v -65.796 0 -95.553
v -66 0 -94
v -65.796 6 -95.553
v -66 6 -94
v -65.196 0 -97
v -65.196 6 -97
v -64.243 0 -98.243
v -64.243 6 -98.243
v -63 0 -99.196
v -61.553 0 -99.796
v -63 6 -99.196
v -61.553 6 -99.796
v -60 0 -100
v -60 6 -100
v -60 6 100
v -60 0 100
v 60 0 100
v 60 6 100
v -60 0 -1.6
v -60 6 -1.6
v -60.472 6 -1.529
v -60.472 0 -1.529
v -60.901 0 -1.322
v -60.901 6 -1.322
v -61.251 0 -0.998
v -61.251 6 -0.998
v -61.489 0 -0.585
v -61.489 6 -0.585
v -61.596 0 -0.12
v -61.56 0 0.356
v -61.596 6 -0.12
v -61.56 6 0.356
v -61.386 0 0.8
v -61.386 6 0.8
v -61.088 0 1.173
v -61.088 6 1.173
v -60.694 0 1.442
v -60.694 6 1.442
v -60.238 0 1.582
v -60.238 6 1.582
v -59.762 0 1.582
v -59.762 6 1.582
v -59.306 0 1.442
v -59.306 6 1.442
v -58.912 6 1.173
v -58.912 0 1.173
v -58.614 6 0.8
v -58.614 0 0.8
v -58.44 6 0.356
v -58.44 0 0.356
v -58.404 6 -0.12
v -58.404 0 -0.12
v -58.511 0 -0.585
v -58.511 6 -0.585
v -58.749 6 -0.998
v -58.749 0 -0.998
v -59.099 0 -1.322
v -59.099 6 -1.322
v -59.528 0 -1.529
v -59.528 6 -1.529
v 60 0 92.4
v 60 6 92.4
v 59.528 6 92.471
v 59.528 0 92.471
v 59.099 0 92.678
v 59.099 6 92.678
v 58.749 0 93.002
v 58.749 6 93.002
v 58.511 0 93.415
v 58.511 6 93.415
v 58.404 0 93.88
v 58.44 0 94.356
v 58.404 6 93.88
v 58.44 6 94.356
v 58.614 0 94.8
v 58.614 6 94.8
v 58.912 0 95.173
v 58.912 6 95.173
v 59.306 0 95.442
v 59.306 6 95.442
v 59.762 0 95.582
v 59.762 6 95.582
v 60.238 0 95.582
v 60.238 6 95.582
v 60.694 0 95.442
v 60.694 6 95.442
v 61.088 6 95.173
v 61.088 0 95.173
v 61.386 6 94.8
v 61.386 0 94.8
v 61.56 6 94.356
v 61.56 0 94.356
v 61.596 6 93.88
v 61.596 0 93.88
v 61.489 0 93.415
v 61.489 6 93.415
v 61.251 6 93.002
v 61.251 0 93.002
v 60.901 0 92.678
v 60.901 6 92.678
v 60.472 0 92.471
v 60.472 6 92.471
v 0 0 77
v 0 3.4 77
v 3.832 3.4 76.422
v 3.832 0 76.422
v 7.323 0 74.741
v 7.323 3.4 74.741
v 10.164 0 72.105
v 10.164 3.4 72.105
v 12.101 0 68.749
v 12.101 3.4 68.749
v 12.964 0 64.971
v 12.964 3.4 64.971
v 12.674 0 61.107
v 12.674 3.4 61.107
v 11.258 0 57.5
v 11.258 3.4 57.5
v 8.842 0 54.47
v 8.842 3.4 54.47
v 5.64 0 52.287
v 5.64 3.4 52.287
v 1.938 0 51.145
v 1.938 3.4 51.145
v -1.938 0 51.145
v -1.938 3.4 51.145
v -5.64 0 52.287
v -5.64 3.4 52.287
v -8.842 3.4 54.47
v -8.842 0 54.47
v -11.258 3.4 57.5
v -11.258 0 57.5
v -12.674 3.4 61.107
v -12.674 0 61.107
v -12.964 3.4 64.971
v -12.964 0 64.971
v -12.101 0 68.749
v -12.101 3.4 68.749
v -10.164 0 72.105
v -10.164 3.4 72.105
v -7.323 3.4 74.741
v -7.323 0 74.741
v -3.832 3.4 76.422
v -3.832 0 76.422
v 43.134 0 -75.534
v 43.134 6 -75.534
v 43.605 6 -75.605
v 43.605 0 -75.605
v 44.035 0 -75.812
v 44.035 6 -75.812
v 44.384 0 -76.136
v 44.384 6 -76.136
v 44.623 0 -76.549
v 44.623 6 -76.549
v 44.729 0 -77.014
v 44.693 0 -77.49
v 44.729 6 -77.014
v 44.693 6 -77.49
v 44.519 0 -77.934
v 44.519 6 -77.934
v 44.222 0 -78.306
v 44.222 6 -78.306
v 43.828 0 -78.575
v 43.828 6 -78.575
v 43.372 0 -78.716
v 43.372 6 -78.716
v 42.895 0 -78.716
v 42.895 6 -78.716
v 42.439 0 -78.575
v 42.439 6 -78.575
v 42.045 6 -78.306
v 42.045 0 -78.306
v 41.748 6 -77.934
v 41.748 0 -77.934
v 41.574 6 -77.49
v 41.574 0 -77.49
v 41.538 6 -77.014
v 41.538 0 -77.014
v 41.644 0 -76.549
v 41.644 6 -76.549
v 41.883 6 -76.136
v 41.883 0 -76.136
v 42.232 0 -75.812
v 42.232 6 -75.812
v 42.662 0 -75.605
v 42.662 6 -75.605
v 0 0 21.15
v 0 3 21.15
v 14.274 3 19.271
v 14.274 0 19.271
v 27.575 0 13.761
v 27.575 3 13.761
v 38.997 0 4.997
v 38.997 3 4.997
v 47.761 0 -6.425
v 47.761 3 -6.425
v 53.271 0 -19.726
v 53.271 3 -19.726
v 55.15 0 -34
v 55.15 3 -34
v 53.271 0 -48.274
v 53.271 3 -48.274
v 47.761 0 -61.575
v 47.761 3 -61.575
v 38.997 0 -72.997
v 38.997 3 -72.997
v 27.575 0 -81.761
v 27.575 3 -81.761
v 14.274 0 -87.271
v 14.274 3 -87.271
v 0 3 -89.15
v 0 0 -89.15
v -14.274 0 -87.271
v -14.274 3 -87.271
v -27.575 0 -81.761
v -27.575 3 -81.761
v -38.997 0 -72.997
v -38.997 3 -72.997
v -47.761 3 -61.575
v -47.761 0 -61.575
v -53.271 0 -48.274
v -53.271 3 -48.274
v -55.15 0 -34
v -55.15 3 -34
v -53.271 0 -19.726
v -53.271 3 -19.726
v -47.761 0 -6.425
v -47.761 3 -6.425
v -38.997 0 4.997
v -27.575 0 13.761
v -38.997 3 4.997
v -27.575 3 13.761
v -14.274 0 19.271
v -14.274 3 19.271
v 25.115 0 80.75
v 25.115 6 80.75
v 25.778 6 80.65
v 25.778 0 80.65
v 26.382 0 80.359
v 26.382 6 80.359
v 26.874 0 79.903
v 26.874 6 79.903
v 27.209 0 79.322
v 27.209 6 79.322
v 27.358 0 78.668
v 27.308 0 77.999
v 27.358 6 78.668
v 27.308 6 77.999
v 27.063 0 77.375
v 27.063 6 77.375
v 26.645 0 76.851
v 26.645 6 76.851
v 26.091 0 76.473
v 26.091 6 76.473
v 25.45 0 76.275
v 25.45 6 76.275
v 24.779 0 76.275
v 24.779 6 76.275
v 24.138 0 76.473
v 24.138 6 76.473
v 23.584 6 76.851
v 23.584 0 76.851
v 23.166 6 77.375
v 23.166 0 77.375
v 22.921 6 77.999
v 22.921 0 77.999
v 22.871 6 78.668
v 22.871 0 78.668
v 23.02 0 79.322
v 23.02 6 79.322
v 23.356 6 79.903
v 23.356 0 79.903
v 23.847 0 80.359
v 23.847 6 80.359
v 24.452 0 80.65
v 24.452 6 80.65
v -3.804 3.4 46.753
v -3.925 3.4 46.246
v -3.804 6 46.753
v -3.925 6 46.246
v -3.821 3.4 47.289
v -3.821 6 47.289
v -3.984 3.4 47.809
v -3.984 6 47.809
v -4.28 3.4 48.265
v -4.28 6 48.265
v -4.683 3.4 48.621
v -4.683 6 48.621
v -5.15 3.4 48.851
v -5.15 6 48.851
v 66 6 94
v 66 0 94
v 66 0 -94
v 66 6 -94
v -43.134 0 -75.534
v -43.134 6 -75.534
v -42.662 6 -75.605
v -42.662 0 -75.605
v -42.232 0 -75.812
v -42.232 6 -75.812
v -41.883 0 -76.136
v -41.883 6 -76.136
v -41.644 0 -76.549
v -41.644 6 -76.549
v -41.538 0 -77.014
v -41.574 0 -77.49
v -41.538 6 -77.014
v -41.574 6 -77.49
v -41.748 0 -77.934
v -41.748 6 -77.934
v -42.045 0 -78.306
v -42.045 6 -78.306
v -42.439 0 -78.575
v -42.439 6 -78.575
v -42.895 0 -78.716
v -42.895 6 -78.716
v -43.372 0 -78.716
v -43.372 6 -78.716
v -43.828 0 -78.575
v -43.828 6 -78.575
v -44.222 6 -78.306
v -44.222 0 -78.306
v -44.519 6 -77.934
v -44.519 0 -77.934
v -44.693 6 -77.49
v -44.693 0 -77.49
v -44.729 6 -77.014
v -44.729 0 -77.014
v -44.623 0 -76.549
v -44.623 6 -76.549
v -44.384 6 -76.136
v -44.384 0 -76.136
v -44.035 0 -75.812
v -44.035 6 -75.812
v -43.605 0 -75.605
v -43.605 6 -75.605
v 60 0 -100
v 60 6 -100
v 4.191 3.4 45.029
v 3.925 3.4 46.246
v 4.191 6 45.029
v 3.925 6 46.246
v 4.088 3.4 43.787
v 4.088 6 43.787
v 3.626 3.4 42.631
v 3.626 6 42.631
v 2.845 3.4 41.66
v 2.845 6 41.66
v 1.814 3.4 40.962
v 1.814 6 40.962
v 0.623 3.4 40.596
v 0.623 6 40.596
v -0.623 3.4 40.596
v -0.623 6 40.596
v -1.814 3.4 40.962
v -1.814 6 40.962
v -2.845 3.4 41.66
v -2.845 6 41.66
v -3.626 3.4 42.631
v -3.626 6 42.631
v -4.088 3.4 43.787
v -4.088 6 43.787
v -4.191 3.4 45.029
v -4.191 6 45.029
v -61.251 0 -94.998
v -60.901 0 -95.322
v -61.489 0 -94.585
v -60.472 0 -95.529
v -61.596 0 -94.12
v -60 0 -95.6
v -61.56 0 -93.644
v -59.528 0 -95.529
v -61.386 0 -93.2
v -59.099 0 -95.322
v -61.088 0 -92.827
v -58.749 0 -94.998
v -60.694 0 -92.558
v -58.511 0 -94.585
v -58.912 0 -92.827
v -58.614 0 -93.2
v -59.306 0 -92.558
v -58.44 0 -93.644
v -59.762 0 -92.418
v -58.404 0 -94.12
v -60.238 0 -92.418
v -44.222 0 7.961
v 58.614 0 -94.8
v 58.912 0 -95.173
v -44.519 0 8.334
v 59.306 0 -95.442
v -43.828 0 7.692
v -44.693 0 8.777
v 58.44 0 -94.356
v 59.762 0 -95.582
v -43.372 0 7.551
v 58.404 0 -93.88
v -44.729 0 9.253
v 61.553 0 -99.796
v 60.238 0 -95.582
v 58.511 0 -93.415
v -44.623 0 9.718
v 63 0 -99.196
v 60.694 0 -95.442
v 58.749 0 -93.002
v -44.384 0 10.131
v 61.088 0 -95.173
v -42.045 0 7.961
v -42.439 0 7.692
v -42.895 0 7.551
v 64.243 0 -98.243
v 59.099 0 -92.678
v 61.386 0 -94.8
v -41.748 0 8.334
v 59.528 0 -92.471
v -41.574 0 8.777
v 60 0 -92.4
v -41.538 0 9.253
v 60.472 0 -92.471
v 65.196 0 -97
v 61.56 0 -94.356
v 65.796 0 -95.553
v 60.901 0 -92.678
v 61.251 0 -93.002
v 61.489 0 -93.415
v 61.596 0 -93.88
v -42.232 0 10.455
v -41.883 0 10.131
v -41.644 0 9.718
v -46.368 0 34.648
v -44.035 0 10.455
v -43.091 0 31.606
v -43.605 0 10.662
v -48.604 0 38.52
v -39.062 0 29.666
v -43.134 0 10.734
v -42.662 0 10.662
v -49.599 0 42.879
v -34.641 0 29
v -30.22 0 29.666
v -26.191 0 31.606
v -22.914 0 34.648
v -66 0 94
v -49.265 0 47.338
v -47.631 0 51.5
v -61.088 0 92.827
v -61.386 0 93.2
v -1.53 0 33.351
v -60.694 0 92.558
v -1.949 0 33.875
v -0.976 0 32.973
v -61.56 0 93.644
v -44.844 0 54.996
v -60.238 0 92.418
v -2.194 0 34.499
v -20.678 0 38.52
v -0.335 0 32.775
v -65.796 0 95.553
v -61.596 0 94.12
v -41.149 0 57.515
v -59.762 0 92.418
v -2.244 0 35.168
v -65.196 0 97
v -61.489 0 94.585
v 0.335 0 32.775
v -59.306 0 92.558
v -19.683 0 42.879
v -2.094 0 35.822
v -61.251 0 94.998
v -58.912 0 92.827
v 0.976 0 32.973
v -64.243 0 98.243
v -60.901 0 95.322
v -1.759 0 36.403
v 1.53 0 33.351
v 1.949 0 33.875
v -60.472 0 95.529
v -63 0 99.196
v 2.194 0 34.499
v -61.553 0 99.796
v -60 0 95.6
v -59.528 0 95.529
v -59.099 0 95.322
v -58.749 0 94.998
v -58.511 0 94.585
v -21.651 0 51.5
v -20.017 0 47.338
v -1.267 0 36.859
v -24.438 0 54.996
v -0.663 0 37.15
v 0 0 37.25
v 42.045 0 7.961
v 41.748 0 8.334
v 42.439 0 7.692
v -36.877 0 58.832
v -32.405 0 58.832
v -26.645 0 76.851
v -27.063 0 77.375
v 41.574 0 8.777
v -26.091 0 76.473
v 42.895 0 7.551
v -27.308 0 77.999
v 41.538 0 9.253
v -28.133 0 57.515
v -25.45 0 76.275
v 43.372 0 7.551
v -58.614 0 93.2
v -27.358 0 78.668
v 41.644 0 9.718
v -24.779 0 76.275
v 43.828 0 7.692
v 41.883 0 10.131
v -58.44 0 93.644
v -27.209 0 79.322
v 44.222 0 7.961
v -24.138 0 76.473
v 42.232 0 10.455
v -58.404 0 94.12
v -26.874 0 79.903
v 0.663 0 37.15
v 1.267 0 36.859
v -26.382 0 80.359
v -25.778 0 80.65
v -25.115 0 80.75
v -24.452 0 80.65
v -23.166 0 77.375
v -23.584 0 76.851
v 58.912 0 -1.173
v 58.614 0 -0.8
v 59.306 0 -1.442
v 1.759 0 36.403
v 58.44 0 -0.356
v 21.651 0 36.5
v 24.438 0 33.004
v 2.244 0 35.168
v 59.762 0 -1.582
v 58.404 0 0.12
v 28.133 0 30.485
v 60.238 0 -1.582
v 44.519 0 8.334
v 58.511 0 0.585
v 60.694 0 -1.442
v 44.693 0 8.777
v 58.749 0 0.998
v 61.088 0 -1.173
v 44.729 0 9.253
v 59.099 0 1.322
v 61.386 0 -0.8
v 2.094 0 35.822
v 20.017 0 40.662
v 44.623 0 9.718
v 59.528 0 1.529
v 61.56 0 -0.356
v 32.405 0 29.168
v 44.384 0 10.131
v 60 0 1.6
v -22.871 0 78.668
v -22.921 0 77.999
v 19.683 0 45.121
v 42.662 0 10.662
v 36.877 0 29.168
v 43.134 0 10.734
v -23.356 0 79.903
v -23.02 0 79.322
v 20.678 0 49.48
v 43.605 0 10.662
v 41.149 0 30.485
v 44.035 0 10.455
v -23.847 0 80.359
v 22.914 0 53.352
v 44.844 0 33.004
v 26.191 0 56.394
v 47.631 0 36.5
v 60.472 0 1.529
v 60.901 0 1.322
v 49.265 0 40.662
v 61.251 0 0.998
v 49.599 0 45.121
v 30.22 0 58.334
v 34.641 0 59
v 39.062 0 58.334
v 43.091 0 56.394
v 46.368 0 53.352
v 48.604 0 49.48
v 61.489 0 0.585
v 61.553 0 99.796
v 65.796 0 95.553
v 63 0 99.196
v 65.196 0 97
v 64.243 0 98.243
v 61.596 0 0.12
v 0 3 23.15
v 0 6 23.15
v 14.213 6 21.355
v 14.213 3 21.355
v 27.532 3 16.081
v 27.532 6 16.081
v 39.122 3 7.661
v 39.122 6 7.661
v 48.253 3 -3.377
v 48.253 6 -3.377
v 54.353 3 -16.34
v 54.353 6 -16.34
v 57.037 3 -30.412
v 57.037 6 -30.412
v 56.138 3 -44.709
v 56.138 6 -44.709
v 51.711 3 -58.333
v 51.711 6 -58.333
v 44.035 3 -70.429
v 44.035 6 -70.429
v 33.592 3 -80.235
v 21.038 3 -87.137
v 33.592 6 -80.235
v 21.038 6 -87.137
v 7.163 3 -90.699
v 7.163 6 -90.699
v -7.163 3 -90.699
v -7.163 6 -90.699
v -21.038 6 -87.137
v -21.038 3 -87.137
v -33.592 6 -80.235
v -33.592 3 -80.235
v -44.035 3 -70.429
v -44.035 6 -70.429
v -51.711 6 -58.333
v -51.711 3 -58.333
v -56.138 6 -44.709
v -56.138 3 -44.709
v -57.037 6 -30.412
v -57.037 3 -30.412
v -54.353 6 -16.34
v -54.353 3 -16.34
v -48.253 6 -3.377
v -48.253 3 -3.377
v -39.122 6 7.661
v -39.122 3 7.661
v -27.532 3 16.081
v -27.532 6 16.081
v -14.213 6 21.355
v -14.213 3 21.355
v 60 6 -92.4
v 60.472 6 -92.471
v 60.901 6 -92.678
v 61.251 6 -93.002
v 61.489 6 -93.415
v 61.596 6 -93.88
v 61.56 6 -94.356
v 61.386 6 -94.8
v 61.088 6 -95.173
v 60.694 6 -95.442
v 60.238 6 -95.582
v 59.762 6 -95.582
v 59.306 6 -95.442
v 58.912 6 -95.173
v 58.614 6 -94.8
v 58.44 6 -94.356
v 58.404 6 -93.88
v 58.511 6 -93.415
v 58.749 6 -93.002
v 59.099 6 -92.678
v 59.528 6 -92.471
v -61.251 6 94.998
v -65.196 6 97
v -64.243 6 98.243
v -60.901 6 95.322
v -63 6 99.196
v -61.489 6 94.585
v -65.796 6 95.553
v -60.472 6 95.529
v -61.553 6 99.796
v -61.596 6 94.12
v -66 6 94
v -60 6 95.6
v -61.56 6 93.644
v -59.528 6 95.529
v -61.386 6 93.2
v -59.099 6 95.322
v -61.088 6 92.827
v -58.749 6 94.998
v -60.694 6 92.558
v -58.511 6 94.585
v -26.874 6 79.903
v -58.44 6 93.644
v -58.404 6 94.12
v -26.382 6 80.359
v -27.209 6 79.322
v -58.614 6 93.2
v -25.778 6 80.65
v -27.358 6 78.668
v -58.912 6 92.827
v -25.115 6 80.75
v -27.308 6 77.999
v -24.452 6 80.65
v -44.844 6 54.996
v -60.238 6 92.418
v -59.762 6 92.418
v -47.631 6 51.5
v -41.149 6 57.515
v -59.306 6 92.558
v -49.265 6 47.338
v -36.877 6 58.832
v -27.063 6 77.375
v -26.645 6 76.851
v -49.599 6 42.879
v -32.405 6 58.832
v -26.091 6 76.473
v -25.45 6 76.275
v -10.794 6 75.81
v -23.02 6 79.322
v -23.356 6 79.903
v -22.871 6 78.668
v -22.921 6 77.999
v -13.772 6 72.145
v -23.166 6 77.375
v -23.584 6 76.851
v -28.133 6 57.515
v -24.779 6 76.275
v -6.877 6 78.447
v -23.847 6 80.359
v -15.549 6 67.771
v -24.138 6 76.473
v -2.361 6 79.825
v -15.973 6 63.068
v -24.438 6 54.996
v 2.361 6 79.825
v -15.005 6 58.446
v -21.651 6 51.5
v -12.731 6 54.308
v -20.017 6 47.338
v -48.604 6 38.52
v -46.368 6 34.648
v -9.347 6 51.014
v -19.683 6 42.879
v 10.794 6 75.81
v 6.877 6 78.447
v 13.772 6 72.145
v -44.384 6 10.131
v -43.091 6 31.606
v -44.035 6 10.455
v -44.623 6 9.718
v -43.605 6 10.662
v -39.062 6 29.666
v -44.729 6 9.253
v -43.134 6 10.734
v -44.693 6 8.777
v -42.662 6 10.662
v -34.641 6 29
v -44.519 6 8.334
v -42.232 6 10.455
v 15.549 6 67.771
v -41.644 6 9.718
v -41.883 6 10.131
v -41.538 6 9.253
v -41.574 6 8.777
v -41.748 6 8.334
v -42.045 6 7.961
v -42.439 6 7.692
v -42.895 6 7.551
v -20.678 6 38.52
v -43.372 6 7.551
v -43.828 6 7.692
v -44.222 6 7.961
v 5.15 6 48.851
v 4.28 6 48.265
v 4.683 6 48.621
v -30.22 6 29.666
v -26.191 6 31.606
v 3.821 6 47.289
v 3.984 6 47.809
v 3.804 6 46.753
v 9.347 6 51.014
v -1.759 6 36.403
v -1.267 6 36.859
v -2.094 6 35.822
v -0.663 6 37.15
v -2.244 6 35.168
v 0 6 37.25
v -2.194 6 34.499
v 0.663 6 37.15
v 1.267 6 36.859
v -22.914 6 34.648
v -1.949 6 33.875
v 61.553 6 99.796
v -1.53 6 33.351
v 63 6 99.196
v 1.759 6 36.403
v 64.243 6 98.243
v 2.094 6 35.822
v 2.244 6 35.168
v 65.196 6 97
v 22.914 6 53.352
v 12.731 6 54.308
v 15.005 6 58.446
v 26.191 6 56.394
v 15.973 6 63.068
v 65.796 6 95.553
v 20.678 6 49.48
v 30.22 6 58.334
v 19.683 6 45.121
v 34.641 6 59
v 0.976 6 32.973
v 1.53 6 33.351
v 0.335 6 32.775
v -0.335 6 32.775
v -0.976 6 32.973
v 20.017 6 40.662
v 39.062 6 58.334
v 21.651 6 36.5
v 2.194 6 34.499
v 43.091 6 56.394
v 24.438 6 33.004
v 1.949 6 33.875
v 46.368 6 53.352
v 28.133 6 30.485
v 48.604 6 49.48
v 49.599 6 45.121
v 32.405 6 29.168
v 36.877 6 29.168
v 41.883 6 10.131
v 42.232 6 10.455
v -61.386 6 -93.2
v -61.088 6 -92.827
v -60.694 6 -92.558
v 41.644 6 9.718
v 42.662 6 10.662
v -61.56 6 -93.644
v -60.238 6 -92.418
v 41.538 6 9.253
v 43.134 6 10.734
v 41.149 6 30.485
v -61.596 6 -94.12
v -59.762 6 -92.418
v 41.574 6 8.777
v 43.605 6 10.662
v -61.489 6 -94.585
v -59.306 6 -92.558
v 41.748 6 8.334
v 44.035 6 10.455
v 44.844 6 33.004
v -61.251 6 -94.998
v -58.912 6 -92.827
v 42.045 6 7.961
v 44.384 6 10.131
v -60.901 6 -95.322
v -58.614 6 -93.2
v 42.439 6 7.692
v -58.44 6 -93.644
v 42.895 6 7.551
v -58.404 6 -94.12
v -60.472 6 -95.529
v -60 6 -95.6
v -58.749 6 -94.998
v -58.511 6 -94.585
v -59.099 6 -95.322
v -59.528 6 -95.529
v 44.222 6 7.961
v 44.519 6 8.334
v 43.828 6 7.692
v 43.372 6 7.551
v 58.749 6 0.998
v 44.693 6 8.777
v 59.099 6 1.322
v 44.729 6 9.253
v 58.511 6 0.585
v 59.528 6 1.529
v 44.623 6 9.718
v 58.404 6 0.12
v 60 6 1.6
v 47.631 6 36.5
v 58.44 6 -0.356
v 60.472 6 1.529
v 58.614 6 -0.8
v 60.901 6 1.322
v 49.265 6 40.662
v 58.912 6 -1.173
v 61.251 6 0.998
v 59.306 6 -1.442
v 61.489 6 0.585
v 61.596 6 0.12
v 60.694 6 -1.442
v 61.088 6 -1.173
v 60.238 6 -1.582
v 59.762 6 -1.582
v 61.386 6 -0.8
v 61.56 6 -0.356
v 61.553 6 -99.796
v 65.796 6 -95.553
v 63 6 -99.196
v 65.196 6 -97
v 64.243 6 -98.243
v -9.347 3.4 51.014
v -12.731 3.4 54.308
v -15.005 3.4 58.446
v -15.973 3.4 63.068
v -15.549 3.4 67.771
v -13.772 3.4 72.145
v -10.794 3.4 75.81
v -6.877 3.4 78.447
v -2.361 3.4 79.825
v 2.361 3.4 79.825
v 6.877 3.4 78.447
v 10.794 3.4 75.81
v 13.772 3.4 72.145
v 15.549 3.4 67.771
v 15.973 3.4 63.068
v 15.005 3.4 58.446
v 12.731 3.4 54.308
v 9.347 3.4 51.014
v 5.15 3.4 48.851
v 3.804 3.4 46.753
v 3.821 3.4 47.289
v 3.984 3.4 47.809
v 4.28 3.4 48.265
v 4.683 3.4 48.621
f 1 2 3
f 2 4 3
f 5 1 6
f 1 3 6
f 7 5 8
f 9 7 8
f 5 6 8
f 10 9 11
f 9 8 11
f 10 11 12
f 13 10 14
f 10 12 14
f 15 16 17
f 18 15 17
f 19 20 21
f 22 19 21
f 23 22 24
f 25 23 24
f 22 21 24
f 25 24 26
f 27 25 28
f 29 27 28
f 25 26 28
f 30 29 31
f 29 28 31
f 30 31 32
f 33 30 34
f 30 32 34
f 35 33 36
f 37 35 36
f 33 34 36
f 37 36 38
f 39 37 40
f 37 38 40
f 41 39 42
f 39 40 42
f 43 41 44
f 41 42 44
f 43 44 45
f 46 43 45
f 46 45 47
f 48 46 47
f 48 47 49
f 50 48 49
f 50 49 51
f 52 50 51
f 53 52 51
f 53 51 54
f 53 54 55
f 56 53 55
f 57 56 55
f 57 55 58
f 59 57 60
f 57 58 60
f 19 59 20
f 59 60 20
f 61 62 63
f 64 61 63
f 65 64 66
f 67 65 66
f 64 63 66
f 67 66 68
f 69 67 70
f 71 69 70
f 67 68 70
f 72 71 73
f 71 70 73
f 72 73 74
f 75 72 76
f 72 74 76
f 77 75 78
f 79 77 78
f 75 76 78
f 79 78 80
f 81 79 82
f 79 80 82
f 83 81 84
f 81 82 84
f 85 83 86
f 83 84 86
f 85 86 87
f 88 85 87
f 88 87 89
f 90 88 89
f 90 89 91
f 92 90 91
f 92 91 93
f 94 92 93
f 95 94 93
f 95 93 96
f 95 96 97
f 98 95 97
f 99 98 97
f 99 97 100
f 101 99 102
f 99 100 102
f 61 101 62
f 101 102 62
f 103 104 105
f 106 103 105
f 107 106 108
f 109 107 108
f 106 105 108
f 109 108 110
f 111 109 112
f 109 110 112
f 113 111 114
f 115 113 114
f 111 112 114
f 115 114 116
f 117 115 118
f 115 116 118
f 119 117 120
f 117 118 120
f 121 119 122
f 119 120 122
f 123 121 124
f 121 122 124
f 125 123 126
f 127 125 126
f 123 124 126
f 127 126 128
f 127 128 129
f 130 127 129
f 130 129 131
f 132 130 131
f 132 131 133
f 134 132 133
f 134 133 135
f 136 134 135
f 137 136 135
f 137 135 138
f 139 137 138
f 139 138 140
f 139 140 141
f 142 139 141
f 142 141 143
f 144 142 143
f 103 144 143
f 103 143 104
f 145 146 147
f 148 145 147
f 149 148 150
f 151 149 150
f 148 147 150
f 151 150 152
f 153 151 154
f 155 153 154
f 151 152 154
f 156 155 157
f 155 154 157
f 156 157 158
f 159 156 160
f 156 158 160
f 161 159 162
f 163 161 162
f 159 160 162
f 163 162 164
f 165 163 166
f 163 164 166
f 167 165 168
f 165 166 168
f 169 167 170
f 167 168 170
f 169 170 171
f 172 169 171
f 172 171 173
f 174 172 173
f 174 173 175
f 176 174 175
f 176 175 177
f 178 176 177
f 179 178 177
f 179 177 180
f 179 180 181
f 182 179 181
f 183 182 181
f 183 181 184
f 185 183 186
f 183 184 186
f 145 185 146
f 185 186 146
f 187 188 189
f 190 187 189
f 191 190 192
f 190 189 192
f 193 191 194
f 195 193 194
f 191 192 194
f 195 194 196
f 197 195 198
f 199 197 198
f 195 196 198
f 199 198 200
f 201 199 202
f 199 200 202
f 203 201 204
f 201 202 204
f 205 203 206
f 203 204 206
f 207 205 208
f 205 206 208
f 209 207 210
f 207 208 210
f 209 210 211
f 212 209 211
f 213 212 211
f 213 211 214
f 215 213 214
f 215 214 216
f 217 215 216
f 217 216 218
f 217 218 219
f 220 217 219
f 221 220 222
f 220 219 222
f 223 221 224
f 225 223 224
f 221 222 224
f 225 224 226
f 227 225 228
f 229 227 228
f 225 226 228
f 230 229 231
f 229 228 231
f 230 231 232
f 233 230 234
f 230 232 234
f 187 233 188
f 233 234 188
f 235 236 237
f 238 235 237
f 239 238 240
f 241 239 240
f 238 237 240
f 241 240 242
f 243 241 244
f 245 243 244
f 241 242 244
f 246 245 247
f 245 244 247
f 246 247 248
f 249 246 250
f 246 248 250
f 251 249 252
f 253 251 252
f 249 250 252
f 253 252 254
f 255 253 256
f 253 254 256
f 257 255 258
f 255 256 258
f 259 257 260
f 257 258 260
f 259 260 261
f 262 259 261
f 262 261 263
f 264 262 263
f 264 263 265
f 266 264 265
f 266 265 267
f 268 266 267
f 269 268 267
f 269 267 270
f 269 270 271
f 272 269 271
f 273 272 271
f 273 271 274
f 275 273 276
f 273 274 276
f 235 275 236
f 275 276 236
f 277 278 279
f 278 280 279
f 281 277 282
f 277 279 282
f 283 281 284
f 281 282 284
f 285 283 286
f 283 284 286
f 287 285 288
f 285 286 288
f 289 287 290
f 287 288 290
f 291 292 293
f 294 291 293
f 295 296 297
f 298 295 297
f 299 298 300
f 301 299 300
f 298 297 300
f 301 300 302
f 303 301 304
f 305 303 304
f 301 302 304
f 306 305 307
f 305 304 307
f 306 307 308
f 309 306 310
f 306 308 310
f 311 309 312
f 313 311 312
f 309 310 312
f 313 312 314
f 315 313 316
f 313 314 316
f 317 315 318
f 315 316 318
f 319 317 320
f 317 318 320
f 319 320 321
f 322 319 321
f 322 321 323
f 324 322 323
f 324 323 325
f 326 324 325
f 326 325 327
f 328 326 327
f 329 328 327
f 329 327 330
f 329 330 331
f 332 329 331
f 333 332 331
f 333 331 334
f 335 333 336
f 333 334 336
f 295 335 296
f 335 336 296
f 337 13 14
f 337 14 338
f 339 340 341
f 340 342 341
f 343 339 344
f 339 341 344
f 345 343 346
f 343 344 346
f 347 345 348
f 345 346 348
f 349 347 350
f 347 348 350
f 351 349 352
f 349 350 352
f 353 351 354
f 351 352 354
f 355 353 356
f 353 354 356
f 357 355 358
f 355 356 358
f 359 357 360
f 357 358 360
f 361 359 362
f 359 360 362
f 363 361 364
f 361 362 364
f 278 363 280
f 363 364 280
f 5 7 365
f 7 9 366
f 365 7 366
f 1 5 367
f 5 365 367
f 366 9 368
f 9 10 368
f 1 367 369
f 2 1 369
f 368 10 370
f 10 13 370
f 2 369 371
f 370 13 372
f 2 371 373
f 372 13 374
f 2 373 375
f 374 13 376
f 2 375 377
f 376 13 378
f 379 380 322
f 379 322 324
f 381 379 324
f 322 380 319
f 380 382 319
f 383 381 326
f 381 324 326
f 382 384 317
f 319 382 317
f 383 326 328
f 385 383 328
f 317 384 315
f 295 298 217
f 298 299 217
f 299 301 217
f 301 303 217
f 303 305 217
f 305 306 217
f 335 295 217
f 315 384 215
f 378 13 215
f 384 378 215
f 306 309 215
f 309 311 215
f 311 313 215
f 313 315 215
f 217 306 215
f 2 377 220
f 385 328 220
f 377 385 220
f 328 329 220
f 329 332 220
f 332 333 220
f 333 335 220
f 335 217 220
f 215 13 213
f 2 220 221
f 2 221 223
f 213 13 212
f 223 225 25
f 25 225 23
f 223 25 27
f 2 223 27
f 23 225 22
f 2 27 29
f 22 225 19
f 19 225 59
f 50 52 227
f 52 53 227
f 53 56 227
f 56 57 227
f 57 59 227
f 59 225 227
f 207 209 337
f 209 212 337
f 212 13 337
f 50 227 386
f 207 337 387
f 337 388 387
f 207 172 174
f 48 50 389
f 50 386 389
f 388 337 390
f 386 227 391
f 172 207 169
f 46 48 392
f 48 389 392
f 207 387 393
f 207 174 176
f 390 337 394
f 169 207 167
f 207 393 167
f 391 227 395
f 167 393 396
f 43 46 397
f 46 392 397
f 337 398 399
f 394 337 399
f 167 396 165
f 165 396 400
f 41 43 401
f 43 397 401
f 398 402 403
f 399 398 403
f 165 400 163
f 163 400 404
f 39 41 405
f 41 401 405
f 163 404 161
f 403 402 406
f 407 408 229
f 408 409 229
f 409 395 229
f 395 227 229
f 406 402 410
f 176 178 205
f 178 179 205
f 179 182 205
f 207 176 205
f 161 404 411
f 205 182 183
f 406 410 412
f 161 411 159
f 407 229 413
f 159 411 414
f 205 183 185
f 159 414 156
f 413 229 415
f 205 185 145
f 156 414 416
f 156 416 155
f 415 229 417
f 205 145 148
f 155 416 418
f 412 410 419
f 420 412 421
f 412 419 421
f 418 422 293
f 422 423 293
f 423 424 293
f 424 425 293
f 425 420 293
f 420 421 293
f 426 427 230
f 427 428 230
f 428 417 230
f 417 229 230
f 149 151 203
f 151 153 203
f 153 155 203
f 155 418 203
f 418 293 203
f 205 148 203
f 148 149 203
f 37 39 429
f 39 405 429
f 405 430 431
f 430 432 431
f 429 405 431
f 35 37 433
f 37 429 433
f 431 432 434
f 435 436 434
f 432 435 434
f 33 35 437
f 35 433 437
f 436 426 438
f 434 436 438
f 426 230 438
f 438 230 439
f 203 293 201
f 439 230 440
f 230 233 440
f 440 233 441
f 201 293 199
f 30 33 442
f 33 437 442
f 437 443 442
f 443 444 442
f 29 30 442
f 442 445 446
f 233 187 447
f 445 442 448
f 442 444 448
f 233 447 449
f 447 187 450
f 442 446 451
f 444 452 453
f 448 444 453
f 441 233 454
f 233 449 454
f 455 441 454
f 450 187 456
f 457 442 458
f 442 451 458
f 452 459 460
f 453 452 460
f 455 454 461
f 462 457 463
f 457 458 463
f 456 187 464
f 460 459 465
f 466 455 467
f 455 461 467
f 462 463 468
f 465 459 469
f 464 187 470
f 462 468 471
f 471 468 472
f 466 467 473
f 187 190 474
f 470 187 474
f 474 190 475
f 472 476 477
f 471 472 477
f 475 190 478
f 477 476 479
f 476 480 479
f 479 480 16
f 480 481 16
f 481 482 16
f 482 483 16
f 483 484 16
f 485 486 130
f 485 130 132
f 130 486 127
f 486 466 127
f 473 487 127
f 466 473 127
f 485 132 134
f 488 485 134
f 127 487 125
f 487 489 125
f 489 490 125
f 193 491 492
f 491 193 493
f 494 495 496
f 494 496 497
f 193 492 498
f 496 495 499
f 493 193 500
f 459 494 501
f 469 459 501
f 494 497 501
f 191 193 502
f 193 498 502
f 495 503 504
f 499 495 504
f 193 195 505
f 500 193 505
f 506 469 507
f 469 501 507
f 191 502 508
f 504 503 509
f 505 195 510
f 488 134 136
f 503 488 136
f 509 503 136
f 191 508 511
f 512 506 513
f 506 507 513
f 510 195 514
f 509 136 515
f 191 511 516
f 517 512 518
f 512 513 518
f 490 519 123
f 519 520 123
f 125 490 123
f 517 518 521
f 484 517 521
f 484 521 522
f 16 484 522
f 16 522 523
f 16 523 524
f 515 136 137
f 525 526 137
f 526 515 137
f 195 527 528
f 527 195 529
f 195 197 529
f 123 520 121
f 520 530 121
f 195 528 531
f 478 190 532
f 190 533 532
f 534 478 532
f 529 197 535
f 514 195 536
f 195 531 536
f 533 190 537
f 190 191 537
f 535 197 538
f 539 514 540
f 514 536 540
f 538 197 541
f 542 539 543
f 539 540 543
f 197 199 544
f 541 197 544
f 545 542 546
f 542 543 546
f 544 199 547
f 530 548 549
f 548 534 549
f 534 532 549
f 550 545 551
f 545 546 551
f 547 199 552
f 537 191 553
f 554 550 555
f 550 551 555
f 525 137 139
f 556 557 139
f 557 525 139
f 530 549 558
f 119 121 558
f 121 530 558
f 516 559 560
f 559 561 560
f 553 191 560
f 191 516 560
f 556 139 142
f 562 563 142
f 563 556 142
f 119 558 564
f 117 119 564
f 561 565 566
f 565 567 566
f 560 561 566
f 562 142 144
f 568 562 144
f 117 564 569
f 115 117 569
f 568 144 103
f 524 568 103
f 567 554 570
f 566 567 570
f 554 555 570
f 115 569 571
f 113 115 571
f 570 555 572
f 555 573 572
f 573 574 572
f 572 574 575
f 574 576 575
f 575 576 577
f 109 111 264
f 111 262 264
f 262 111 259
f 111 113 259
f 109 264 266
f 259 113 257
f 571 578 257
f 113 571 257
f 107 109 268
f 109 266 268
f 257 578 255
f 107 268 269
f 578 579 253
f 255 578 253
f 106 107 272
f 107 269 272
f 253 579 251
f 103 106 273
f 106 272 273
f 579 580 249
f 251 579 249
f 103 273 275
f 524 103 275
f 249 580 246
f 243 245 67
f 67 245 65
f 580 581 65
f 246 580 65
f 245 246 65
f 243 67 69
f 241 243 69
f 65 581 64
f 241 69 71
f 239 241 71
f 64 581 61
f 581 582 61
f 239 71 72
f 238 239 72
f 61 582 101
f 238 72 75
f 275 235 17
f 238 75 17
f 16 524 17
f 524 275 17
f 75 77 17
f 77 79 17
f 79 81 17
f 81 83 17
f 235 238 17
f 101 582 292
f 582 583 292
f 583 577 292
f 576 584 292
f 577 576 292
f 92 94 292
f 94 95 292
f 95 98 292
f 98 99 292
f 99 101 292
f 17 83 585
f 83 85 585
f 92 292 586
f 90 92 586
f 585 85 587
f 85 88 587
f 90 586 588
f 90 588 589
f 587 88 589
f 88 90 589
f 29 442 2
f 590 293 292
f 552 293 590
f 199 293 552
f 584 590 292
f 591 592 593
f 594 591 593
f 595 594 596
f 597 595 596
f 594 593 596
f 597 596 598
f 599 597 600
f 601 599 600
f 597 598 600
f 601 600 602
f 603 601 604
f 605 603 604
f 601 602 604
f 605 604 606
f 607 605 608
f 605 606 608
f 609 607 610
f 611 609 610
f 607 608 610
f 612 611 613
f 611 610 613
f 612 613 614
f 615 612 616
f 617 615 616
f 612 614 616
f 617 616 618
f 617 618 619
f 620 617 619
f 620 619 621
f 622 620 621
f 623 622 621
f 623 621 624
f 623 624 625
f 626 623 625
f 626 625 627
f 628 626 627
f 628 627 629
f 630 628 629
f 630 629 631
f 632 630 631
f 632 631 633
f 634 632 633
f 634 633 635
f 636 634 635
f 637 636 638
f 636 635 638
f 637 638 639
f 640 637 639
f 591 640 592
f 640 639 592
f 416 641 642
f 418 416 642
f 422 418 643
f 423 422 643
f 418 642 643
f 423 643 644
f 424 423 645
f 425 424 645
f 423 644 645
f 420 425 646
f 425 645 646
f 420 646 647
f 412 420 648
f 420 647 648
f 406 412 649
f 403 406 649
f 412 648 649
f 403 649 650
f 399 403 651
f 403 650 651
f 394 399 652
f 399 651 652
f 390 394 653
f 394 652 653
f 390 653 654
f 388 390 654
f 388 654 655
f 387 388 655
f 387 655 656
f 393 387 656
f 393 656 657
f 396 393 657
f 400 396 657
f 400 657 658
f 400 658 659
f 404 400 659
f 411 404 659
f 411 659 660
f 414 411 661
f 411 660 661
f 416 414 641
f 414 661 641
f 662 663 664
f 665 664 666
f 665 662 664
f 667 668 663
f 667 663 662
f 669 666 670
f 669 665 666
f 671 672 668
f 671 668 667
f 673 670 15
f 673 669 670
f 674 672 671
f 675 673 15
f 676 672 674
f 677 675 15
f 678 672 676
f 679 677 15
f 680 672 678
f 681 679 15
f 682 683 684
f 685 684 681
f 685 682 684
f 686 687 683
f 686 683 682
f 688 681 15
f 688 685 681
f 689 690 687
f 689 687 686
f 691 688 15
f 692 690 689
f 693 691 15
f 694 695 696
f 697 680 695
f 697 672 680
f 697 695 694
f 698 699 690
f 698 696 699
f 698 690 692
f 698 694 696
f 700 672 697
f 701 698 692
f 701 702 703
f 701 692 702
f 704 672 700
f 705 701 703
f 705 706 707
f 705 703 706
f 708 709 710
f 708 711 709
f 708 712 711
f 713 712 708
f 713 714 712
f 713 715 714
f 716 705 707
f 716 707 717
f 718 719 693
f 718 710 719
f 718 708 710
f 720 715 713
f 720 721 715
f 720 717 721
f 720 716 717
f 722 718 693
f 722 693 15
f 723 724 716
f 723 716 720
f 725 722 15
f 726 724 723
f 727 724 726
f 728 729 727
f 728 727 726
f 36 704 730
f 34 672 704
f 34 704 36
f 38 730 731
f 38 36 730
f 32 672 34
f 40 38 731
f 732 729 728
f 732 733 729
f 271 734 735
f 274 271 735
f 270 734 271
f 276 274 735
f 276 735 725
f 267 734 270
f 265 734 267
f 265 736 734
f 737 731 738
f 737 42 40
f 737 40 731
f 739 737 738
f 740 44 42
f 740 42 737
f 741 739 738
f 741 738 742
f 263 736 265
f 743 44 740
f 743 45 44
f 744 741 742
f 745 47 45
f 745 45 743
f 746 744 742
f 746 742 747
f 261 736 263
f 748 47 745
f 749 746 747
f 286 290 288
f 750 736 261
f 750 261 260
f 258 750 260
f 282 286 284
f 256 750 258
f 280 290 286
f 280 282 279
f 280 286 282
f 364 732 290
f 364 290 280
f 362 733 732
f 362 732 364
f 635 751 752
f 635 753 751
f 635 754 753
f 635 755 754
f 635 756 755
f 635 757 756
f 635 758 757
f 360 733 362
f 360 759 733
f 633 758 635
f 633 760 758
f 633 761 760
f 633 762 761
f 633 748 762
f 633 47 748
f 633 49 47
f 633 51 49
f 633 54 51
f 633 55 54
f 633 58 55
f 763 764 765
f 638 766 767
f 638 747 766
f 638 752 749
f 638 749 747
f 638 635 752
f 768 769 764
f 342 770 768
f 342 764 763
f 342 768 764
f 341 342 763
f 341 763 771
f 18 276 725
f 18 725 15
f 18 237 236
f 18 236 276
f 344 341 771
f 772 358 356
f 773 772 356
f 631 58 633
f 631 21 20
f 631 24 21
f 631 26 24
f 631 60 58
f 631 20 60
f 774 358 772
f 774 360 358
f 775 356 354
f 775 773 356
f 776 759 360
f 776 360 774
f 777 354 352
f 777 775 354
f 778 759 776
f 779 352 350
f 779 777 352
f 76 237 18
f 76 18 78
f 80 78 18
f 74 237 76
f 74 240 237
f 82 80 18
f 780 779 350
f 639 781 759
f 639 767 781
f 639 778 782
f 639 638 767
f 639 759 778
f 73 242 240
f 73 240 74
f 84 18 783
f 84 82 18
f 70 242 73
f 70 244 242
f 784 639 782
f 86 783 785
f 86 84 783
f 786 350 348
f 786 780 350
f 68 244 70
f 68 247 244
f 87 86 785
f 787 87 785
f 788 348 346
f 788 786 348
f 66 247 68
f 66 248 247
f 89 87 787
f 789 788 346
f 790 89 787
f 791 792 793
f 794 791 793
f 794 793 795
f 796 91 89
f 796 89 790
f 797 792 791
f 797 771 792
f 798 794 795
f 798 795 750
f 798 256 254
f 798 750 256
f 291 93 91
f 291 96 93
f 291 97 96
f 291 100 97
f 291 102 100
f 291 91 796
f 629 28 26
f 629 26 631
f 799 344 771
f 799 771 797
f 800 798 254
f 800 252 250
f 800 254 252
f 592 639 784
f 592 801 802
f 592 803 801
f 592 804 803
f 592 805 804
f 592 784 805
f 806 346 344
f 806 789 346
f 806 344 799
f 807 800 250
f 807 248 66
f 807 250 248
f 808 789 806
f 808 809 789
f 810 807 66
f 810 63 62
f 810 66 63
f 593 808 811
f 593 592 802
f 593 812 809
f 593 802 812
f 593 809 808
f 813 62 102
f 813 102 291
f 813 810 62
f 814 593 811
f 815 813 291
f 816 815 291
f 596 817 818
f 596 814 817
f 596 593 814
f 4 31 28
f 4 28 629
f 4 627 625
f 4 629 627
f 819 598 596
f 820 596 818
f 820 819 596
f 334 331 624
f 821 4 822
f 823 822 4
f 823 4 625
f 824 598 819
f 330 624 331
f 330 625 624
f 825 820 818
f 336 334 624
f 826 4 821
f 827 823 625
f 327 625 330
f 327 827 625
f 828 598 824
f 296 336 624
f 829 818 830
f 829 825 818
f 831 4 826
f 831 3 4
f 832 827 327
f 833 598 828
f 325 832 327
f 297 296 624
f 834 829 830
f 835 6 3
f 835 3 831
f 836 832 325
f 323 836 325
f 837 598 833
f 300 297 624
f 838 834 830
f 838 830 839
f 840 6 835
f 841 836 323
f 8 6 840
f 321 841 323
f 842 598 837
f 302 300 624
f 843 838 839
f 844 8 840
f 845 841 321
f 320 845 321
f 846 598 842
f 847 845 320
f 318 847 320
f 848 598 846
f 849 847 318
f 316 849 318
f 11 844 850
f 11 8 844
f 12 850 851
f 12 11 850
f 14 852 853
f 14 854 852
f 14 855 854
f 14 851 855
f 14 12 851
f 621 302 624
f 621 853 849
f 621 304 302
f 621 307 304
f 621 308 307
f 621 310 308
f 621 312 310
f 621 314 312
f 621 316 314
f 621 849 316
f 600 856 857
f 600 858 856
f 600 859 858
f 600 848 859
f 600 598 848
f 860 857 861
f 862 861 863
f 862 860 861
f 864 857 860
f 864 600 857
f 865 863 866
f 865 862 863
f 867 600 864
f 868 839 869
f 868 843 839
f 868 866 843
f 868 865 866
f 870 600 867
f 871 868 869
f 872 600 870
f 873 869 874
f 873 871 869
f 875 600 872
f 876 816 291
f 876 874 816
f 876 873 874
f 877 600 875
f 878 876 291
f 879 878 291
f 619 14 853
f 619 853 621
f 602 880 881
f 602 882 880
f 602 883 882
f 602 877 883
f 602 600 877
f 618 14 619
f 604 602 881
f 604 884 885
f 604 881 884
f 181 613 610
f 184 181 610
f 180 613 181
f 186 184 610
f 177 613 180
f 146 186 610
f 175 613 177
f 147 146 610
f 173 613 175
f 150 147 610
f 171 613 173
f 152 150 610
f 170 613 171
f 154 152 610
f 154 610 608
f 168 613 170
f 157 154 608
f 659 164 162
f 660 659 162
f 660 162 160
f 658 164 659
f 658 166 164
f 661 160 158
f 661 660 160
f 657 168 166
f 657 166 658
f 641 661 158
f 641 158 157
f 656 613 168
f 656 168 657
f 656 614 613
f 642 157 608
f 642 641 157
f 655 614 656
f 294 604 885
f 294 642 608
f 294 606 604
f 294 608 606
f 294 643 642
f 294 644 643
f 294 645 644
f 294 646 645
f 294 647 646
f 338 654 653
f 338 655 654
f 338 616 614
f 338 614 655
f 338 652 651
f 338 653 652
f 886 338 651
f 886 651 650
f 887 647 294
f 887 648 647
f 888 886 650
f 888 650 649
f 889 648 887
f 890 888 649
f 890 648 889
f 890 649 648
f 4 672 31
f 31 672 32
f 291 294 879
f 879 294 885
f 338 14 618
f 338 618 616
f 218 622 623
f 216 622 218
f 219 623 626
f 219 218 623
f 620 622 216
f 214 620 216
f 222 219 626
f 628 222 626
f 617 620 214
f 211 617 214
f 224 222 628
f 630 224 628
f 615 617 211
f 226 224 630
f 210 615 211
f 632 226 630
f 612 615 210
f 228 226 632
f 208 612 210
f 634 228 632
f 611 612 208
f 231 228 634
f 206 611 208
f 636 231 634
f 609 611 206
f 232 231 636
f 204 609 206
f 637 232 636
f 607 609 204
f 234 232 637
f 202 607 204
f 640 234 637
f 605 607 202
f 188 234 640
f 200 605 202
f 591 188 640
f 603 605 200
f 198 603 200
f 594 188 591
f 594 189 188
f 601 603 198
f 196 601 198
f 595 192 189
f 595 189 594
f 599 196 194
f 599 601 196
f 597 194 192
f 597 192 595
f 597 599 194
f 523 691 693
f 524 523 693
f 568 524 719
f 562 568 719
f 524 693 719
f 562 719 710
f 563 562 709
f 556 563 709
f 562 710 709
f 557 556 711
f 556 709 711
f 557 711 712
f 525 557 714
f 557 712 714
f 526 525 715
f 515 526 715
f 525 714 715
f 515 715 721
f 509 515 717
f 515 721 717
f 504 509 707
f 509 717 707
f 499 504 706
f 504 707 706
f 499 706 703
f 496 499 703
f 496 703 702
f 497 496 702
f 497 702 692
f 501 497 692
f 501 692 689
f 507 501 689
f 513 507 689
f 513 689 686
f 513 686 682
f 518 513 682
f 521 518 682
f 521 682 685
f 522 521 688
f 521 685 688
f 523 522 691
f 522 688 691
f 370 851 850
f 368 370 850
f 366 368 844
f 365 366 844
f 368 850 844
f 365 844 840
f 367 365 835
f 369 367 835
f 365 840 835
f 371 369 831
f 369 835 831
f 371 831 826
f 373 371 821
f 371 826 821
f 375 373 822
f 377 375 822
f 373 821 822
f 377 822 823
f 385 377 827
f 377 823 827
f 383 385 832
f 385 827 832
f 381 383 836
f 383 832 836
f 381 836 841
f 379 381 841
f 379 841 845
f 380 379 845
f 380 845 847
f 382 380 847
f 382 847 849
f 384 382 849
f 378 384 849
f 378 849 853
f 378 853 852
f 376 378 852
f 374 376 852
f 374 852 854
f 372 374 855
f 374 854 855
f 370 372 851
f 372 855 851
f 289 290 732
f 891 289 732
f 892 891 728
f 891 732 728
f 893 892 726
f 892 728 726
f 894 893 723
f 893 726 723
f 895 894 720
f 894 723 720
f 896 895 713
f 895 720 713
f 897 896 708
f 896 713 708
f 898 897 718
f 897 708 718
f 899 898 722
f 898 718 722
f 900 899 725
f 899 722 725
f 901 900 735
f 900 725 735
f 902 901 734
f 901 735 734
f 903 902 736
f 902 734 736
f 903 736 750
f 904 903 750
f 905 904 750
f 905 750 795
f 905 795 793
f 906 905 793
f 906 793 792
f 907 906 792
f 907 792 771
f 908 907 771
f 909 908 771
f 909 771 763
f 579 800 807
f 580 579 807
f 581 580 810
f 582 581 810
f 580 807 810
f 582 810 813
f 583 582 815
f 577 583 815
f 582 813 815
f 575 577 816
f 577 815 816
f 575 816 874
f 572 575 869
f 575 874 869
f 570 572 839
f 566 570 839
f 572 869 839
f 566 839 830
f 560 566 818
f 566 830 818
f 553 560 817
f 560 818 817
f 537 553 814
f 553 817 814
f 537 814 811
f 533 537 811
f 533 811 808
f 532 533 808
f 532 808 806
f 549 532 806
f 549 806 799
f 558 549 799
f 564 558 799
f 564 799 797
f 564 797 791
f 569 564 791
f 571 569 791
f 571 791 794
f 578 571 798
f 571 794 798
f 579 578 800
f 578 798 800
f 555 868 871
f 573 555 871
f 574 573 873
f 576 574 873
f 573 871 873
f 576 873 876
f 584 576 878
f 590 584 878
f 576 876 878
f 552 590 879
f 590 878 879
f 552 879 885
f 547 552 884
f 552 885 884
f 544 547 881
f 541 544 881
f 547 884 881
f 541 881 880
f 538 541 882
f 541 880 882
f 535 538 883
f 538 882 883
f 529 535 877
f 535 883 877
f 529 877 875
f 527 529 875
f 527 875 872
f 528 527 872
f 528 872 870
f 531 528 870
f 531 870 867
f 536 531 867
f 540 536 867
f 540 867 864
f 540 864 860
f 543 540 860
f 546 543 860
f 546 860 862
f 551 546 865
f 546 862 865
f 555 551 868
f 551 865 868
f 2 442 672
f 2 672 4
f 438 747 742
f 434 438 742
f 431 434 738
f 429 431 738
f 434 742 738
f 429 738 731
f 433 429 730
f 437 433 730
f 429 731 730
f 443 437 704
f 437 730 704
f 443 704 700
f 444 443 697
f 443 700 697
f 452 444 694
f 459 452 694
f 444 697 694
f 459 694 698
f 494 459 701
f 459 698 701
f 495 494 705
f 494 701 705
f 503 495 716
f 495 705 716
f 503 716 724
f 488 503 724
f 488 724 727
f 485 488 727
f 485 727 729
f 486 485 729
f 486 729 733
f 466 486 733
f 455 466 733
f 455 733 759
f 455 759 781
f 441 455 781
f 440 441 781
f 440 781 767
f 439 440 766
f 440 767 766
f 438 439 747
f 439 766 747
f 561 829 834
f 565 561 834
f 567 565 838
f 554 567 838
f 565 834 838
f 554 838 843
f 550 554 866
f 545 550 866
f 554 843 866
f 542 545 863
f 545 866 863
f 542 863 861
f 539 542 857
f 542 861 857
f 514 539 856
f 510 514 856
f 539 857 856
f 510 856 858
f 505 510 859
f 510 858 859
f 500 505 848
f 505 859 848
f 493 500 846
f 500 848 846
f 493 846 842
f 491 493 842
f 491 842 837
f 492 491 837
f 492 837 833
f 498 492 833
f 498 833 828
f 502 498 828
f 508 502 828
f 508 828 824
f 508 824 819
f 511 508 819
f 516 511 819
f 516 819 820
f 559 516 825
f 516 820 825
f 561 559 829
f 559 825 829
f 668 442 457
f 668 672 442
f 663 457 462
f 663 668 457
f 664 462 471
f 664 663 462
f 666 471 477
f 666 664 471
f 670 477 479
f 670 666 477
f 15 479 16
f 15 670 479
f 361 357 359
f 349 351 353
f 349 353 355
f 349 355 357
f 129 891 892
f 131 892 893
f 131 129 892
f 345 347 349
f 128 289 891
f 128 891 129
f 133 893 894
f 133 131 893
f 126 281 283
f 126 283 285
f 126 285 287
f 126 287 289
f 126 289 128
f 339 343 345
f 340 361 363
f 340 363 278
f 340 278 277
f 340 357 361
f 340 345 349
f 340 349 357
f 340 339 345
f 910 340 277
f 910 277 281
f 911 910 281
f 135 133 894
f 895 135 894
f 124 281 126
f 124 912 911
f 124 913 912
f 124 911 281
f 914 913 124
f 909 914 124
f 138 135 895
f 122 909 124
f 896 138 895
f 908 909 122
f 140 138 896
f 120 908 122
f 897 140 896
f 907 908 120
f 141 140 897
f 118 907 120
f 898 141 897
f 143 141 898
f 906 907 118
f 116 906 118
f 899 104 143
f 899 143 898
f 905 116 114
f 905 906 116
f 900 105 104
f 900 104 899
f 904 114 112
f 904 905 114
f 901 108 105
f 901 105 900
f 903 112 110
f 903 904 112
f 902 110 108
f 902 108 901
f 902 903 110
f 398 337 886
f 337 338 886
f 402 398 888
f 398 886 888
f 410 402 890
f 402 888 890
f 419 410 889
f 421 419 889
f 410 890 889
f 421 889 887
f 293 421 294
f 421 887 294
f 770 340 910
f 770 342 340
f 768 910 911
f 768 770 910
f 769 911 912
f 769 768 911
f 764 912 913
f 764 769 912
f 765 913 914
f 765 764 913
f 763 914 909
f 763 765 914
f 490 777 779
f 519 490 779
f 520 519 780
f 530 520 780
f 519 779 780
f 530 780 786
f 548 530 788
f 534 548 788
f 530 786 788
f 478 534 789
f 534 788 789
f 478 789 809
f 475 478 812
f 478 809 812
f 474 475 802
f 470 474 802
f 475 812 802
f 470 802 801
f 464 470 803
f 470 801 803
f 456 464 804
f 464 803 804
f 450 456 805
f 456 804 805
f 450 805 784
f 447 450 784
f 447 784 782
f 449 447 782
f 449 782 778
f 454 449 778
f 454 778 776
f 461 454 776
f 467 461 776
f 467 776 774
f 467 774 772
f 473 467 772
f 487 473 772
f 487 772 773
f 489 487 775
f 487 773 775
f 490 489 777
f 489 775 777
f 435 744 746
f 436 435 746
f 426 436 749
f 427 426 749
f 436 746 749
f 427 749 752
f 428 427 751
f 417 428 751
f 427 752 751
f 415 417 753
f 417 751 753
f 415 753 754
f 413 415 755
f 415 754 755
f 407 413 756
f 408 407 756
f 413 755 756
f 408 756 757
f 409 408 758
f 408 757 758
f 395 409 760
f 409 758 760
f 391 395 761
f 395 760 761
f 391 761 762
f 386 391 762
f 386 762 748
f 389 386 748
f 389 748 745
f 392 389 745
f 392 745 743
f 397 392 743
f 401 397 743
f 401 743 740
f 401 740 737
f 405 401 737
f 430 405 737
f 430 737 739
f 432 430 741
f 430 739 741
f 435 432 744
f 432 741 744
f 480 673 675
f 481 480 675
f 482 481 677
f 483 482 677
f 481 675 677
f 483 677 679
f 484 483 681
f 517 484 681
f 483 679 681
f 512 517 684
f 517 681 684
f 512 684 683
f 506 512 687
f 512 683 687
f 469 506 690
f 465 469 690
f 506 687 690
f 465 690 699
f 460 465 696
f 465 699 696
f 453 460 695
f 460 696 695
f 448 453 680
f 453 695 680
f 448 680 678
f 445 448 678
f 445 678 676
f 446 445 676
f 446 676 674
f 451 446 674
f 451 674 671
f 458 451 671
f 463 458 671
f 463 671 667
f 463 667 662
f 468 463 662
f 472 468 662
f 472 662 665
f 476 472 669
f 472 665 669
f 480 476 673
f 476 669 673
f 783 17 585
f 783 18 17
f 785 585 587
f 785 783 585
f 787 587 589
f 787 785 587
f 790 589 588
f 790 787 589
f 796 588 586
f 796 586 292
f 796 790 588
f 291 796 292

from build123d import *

# Parameters (mm, degrees)
SKETCH_2_W          = 132
SKETCH_2_H          = 200
EXTRUDE_1_DEPTH     = 6
SKETCH_3_R          = 57.15
CUT_EXTRUDE_1_DEPTH = 6
EXTRUDE_START       = 3
SKETCH_6_R          = 57.15
SKETCH_6_R_2        = 55.15
EXTRUDE_2_DEPTH     = 3
SKETCH_10_R         = 1.6
CUT_EXTRUDE_2_DEPTH = 6
SKETCH_11_R         = 13
CUT_EXTRUDE_3_DEPTH = 6
SKETCH_12_R         = 16
CUT_EXTRUDE_4_DEPTH = 2.6
SKETCH_13_R         = 4.2
CUT_EXTRUDE_5_DEPTH = 2.6
FILLET_1_R          = 2
SKETCH_14_R         = 2.25
CUT_EXTRUDE_6_DEPTH = 6
FILLET_2_R          = 6
SKETCH_15_R         = 1.6
CUT_EXTRUDE_7_DEPTH = 6
SKETCH_17_R         = 15
CUT_EXTRUDE_9_DEPTH = 6


with BuildPart() as part:
    # 草图2 → 凸台-拉伸1 (new body)
    with BuildSketch(Plane(origin=(0, 0, 0), x_dir=(1, 0, 0), z_dir=(0, 1, 0))):
        Rectangle(SKETCH_2_W, SKETCH_2_H)
    extrude(amount=EXTRUDE_1_DEPTH)

    # 草图3 → 切除-拉伸1 (cut)
    with BuildSketch(Plane(origin=(0, 6, 0), x_dir=(1, 0, 0), z_dir=(0, 1, 0))):
        with Locations(Location((0, 34, 0), (0, 0, 270))):
            Circle(SKETCH_3_R)
    extrude(amount=-CUT_EXTRUDE_1_DEPTH, mode=Mode.SUBTRACT)

    # 草图6 → 凸台-拉伸2 (add)
    with BuildSketch(Plane(origin=(0, 0, 0), x_dir=(1, 0, 0), z_dir=(0, 1, 0)).offset(EXTRUDE_START)):
        with Locations(Location((0, 34, 0), (0, 0, 270))):
            Circle(SKETCH_6_R)
        with Locations(Location((0, 34, 0), (0, 0, 270))):
            Circle(SKETCH_6_R_2, mode=Mode.SUBTRACT)
    extrude(amount=-EXTRUDE_2_DEPTH)

    # 草图10 → 切除-拉伸2 (cut)
    with BuildSketch(Plane(origin=(0, 6, 0), x_dir=(1, 0, 0), z_dir=(0, 1, 0))):
        with Locations(Location((43.133513652, -9.133513652, 0), (0, 0, 270))):
            Circle(SKETCH_10_R)
        with Locations(Location((-43.133513652, -9.133513652, 0), (0, 0, 270))):
            Circle(SKETCH_10_R)
        with Locations(Location((-43.133513652, 77.133513652, 0), (0, 0, 270))):
            Circle(SKETCH_10_R)
        with Locations(Location((43.133513652, 77.133513652, 0), (0, 0, 270))):
            Circle(SKETCH_10_R)
    extrude(amount=-CUT_EXTRUDE_2_DEPTH, mode=Mode.SUBTRACT)

    # 草图11 → 切除-拉伸3 (cut)
    with BuildSketch(Plane(origin=(0, 6, 0), x_dir=(1, 0, 0), z_dir=(0, 1, 0))):
        with Locations(Location((0, -64, 0), (0, 0, 270))):
            Circle(SKETCH_11_R)
    extrude(amount=-CUT_EXTRUDE_3_DEPTH, mode=Mode.SUBTRACT)

    # 草图12 → 切除-拉伸4 (cut)
    with BuildSketch(Plane(origin=(0, 6, 0), x_dir=(1, 0, 0), z_dir=(0, 1, 0))):
        with Locations(Location((0, -64, 0), (0, 0, 270))):
            Circle(SKETCH_12_R)
    extrude(amount=-CUT_EXTRUDE_4_DEPTH, mode=Mode.SUBTRACT)

    # 草图13 → 切除-拉伸5 (cut)
    with BuildSketch(Plane(origin=(0, 6, 0), x_dir=(1, 0, 0), z_dir=(0, 1, 0))):
        with Locations((0, -44.75)):
            Circle(SKETCH_13_R)
    extrude(amount=-CUT_EXTRUDE_5_DEPTH, mode=Mode.SUBTRACT)

    # 圆角1
    fillet_1_edges = [part.edges().sort_by_distance(p)[0] for p in [
        (2.418429967, 4.7, 48.183831169),
        (-2.418429967, 4.7, 48.183831169),
    ]]
    fillet(fillet_1_edges, radius=FILLET_1_R)

    # 草图14 → 切除-拉伸6 (cut)
    with BuildSketch(Plane(origin=(0, 6, 0), x_dir=(1, 0, 0), z_dir=(0, 1, 0))):
        with Locations(Location((0, -35, 0), (0, 0, 270))):
            Circle(SKETCH_14_R)
        with Locations(Location((25.11473671, -78.5, 0), (0, 0, 270))):
            Circle(SKETCH_14_R)
        with Locations(Location((-25.11473671, -78.5, 0), (0, 0, 270))):
            Circle(SKETCH_14_R)
    extrude(amount=-CUT_EXTRUDE_6_DEPTH, mode=Mode.SUBTRACT)

    # 圆角2
    fillet_2_edges = [part.edges().sort_by_distance(p)[0] for p in [
        (66, 3, 100),
        (-66, 3, 100),
        (-66, 3, -100),
        (66, 3, -100),
    ]]
    fillet(fillet_2_edges, radius=FILLET_2_R)

    # 草图15 → 切除-拉伸7 (cut)
    with BuildSketch(Plane(origin=(0, 6, 0), x_dir=(1, 0, 0), z_dir=(0, 1, 0))):
        with Locations(Location((60, 94, 0), (0, 0, 270))):
            Circle(SKETCH_15_R)
        with Locations(Location((-60, 94, 0), (0, 0, 90))):
            Circle(SKETCH_15_R)
        with Locations(Location((60, -94, 0), (0, 0, 90))):
            Circle(SKETCH_15_R)
        with Locations(Location((-60, -94, 0), (0, 0, 270))):
            Circle(SKETCH_15_R)
        with Locations(Location((60, 0, 0), (0, 0, 270))):
            Circle(SKETCH_15_R)
        with Locations(Location((-60, 0, 0), (0, 0, 90))):
            Circle(SKETCH_15_R)
    extrude(amount=-CUT_EXTRUDE_7_DEPTH, mode=Mode.SUBTRACT)

    # 草图17 → 切除-拉伸9 (cut)
    with BuildSketch(Plane(origin=(0, 6, 0), x_dir=(1, 0, 0), z_dir=(0, 1, 0))):
        with Locations(Location((34.641016151, -44, 0), (0, 0, 270))):
            Circle(SKETCH_17_R)
        with Locations(Location((-34.641016151, -44, 0), (0, 0, 90))):
            Circle(SKETCH_17_R)
    extrude(amount=-CUT_EXTRUDE_9_DEPTH, mode=Mode.SUBTRACT)


solid = part.part
